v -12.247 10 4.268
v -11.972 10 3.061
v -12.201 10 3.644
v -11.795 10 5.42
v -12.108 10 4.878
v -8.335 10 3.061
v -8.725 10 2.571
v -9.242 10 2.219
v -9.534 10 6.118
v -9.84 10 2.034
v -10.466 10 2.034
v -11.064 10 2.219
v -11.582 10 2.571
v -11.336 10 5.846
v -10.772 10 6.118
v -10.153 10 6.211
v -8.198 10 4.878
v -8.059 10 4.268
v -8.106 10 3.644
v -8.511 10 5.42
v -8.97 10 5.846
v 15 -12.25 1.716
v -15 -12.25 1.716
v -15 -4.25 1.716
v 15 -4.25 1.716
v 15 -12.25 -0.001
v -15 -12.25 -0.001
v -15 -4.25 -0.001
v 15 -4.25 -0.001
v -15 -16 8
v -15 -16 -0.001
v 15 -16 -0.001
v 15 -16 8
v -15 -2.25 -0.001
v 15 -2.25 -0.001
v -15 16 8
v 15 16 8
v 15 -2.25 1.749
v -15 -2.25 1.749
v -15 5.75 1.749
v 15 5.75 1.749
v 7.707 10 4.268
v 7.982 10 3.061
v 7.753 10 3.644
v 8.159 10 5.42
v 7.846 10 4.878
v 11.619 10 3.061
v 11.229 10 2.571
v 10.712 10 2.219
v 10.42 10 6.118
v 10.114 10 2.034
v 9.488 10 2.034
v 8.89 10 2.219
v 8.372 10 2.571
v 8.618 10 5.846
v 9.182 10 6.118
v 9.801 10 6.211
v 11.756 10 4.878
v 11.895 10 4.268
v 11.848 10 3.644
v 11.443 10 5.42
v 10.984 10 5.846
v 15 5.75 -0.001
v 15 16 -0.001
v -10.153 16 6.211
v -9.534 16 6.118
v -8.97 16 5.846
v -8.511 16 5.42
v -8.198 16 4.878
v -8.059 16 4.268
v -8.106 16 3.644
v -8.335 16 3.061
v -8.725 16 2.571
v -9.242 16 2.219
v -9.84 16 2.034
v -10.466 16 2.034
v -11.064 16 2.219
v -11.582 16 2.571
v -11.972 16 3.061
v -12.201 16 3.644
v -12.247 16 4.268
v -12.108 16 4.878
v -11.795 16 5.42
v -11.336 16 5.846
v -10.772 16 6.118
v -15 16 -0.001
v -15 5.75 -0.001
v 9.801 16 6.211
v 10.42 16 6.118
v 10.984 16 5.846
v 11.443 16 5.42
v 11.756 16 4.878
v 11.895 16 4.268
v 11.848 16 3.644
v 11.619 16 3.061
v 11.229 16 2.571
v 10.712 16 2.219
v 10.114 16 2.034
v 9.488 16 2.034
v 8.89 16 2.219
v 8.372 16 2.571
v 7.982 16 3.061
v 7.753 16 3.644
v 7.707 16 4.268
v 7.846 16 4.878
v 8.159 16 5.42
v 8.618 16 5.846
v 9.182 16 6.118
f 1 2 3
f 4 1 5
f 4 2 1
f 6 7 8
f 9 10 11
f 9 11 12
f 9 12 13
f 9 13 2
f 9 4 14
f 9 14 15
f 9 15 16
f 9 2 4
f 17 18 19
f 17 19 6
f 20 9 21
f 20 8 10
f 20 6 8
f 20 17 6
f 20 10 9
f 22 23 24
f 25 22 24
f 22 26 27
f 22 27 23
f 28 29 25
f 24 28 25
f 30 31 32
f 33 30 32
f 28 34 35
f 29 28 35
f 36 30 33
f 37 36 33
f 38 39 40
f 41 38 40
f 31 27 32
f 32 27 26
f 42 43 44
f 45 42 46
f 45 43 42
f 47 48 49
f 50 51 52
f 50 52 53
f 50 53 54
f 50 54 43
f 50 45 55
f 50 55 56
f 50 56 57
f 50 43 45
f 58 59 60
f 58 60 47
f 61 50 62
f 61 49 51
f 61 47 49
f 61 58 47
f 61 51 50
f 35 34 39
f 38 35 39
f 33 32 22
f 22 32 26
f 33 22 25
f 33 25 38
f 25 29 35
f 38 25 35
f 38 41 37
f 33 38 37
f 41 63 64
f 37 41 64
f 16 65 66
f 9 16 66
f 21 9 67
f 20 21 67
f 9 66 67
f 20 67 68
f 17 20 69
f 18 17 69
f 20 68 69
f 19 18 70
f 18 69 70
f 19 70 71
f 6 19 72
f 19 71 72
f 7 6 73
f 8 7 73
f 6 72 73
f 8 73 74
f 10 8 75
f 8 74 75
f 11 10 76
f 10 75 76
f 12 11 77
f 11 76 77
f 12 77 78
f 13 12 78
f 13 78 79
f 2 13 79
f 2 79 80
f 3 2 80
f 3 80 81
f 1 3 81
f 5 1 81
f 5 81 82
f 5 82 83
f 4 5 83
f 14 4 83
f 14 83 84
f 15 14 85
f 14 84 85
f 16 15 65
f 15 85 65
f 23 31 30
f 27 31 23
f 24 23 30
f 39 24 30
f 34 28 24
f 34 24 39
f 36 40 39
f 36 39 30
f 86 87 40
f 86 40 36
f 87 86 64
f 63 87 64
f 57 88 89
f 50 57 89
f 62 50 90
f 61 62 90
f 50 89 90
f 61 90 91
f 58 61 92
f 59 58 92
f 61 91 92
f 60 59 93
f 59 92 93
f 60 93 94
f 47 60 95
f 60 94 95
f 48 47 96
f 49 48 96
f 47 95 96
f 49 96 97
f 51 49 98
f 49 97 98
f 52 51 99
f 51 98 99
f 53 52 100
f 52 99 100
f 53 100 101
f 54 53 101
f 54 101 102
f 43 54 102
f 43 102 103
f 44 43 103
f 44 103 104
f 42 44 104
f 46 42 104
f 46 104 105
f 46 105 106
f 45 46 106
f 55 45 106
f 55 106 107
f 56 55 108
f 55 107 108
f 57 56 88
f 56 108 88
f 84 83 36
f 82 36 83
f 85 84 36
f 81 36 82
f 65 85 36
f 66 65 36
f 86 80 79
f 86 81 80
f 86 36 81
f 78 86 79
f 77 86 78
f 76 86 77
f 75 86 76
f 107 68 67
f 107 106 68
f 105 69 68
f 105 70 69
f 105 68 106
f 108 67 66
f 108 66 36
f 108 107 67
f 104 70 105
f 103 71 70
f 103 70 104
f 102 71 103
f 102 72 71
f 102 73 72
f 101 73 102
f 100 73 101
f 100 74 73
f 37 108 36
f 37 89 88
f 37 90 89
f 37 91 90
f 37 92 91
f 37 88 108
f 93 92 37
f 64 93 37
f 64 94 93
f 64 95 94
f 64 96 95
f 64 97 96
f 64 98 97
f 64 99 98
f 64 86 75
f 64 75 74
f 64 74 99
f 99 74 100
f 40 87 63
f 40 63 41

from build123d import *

# Parameters (mm, degrees)
BOSS_EXTRUDE1_DEPTH      = 8
BOSS_EXTRUDE1_DEPTH_BACK = 0.001
SKETCH1_W                = 30
SKETCH1_H                = 32
SKETCH3_W                = 1.75
SKETCH3_H                = 8
SKETCH3_W_2              = 1.716544358
CUT_EXTRUDE1_DEPTH       = 35.928498393
SKETCH4_R                = 2.1
CUT_EXTRUDE2_DEPTH       = 6


with BuildPart() as part:
    # Sketch1 → Boss-Extrude1 (new, two sides: drawn at the far end of the back side and taken through both)
    with BuildSketch(Plane.XY.offset(-BOSS_EXTRUDE1_DEPTH_BACK)):
        Rectangle(SKETCH1_W, SKETCH1_H)
    extrude(amount=BOSS_EXTRUDE1_DEPTH + BOSS_EXTRUDE1_DEPTH_BACK)

    # Sketch3 → Cut-Extrude1 (cut, through all)
    with BuildSketch(Plane.ZY.offset(15)):
        with Locations((0.874, 1.75)):
            Rectangle(SKETCH3_W, SKETCH3_H)
        with Locations((0.857272179, -8.249968909)):
            Rectangle(SKETCH3_W_2, SKETCH3_H)
    extrude(amount=-CUT_EXTRUDE1_DEPTH, mode=Mode.SUBTRACT)

    # Sketch4 → Cut-Extrude2 (cut)
    with BuildSketch(Plane(origin=(0, 16, 0), x_dir=(1, 0, 0), z_dir=(0, 1, 0))):
        with Locations(Location((-10.153172438, -4.11086305, 0), (0, 0, 270))):
            Circle(SKETCH4_R)
        with Locations(Location((9.800813668, -4.11086305, 0), (0, 0, 270))):
            Circle(SKETCH4_R)
    extrude(amount=-CUT_EXTRUDE2_DEPTH, mode=Mode.SUBTRACT)


solid = part.part
